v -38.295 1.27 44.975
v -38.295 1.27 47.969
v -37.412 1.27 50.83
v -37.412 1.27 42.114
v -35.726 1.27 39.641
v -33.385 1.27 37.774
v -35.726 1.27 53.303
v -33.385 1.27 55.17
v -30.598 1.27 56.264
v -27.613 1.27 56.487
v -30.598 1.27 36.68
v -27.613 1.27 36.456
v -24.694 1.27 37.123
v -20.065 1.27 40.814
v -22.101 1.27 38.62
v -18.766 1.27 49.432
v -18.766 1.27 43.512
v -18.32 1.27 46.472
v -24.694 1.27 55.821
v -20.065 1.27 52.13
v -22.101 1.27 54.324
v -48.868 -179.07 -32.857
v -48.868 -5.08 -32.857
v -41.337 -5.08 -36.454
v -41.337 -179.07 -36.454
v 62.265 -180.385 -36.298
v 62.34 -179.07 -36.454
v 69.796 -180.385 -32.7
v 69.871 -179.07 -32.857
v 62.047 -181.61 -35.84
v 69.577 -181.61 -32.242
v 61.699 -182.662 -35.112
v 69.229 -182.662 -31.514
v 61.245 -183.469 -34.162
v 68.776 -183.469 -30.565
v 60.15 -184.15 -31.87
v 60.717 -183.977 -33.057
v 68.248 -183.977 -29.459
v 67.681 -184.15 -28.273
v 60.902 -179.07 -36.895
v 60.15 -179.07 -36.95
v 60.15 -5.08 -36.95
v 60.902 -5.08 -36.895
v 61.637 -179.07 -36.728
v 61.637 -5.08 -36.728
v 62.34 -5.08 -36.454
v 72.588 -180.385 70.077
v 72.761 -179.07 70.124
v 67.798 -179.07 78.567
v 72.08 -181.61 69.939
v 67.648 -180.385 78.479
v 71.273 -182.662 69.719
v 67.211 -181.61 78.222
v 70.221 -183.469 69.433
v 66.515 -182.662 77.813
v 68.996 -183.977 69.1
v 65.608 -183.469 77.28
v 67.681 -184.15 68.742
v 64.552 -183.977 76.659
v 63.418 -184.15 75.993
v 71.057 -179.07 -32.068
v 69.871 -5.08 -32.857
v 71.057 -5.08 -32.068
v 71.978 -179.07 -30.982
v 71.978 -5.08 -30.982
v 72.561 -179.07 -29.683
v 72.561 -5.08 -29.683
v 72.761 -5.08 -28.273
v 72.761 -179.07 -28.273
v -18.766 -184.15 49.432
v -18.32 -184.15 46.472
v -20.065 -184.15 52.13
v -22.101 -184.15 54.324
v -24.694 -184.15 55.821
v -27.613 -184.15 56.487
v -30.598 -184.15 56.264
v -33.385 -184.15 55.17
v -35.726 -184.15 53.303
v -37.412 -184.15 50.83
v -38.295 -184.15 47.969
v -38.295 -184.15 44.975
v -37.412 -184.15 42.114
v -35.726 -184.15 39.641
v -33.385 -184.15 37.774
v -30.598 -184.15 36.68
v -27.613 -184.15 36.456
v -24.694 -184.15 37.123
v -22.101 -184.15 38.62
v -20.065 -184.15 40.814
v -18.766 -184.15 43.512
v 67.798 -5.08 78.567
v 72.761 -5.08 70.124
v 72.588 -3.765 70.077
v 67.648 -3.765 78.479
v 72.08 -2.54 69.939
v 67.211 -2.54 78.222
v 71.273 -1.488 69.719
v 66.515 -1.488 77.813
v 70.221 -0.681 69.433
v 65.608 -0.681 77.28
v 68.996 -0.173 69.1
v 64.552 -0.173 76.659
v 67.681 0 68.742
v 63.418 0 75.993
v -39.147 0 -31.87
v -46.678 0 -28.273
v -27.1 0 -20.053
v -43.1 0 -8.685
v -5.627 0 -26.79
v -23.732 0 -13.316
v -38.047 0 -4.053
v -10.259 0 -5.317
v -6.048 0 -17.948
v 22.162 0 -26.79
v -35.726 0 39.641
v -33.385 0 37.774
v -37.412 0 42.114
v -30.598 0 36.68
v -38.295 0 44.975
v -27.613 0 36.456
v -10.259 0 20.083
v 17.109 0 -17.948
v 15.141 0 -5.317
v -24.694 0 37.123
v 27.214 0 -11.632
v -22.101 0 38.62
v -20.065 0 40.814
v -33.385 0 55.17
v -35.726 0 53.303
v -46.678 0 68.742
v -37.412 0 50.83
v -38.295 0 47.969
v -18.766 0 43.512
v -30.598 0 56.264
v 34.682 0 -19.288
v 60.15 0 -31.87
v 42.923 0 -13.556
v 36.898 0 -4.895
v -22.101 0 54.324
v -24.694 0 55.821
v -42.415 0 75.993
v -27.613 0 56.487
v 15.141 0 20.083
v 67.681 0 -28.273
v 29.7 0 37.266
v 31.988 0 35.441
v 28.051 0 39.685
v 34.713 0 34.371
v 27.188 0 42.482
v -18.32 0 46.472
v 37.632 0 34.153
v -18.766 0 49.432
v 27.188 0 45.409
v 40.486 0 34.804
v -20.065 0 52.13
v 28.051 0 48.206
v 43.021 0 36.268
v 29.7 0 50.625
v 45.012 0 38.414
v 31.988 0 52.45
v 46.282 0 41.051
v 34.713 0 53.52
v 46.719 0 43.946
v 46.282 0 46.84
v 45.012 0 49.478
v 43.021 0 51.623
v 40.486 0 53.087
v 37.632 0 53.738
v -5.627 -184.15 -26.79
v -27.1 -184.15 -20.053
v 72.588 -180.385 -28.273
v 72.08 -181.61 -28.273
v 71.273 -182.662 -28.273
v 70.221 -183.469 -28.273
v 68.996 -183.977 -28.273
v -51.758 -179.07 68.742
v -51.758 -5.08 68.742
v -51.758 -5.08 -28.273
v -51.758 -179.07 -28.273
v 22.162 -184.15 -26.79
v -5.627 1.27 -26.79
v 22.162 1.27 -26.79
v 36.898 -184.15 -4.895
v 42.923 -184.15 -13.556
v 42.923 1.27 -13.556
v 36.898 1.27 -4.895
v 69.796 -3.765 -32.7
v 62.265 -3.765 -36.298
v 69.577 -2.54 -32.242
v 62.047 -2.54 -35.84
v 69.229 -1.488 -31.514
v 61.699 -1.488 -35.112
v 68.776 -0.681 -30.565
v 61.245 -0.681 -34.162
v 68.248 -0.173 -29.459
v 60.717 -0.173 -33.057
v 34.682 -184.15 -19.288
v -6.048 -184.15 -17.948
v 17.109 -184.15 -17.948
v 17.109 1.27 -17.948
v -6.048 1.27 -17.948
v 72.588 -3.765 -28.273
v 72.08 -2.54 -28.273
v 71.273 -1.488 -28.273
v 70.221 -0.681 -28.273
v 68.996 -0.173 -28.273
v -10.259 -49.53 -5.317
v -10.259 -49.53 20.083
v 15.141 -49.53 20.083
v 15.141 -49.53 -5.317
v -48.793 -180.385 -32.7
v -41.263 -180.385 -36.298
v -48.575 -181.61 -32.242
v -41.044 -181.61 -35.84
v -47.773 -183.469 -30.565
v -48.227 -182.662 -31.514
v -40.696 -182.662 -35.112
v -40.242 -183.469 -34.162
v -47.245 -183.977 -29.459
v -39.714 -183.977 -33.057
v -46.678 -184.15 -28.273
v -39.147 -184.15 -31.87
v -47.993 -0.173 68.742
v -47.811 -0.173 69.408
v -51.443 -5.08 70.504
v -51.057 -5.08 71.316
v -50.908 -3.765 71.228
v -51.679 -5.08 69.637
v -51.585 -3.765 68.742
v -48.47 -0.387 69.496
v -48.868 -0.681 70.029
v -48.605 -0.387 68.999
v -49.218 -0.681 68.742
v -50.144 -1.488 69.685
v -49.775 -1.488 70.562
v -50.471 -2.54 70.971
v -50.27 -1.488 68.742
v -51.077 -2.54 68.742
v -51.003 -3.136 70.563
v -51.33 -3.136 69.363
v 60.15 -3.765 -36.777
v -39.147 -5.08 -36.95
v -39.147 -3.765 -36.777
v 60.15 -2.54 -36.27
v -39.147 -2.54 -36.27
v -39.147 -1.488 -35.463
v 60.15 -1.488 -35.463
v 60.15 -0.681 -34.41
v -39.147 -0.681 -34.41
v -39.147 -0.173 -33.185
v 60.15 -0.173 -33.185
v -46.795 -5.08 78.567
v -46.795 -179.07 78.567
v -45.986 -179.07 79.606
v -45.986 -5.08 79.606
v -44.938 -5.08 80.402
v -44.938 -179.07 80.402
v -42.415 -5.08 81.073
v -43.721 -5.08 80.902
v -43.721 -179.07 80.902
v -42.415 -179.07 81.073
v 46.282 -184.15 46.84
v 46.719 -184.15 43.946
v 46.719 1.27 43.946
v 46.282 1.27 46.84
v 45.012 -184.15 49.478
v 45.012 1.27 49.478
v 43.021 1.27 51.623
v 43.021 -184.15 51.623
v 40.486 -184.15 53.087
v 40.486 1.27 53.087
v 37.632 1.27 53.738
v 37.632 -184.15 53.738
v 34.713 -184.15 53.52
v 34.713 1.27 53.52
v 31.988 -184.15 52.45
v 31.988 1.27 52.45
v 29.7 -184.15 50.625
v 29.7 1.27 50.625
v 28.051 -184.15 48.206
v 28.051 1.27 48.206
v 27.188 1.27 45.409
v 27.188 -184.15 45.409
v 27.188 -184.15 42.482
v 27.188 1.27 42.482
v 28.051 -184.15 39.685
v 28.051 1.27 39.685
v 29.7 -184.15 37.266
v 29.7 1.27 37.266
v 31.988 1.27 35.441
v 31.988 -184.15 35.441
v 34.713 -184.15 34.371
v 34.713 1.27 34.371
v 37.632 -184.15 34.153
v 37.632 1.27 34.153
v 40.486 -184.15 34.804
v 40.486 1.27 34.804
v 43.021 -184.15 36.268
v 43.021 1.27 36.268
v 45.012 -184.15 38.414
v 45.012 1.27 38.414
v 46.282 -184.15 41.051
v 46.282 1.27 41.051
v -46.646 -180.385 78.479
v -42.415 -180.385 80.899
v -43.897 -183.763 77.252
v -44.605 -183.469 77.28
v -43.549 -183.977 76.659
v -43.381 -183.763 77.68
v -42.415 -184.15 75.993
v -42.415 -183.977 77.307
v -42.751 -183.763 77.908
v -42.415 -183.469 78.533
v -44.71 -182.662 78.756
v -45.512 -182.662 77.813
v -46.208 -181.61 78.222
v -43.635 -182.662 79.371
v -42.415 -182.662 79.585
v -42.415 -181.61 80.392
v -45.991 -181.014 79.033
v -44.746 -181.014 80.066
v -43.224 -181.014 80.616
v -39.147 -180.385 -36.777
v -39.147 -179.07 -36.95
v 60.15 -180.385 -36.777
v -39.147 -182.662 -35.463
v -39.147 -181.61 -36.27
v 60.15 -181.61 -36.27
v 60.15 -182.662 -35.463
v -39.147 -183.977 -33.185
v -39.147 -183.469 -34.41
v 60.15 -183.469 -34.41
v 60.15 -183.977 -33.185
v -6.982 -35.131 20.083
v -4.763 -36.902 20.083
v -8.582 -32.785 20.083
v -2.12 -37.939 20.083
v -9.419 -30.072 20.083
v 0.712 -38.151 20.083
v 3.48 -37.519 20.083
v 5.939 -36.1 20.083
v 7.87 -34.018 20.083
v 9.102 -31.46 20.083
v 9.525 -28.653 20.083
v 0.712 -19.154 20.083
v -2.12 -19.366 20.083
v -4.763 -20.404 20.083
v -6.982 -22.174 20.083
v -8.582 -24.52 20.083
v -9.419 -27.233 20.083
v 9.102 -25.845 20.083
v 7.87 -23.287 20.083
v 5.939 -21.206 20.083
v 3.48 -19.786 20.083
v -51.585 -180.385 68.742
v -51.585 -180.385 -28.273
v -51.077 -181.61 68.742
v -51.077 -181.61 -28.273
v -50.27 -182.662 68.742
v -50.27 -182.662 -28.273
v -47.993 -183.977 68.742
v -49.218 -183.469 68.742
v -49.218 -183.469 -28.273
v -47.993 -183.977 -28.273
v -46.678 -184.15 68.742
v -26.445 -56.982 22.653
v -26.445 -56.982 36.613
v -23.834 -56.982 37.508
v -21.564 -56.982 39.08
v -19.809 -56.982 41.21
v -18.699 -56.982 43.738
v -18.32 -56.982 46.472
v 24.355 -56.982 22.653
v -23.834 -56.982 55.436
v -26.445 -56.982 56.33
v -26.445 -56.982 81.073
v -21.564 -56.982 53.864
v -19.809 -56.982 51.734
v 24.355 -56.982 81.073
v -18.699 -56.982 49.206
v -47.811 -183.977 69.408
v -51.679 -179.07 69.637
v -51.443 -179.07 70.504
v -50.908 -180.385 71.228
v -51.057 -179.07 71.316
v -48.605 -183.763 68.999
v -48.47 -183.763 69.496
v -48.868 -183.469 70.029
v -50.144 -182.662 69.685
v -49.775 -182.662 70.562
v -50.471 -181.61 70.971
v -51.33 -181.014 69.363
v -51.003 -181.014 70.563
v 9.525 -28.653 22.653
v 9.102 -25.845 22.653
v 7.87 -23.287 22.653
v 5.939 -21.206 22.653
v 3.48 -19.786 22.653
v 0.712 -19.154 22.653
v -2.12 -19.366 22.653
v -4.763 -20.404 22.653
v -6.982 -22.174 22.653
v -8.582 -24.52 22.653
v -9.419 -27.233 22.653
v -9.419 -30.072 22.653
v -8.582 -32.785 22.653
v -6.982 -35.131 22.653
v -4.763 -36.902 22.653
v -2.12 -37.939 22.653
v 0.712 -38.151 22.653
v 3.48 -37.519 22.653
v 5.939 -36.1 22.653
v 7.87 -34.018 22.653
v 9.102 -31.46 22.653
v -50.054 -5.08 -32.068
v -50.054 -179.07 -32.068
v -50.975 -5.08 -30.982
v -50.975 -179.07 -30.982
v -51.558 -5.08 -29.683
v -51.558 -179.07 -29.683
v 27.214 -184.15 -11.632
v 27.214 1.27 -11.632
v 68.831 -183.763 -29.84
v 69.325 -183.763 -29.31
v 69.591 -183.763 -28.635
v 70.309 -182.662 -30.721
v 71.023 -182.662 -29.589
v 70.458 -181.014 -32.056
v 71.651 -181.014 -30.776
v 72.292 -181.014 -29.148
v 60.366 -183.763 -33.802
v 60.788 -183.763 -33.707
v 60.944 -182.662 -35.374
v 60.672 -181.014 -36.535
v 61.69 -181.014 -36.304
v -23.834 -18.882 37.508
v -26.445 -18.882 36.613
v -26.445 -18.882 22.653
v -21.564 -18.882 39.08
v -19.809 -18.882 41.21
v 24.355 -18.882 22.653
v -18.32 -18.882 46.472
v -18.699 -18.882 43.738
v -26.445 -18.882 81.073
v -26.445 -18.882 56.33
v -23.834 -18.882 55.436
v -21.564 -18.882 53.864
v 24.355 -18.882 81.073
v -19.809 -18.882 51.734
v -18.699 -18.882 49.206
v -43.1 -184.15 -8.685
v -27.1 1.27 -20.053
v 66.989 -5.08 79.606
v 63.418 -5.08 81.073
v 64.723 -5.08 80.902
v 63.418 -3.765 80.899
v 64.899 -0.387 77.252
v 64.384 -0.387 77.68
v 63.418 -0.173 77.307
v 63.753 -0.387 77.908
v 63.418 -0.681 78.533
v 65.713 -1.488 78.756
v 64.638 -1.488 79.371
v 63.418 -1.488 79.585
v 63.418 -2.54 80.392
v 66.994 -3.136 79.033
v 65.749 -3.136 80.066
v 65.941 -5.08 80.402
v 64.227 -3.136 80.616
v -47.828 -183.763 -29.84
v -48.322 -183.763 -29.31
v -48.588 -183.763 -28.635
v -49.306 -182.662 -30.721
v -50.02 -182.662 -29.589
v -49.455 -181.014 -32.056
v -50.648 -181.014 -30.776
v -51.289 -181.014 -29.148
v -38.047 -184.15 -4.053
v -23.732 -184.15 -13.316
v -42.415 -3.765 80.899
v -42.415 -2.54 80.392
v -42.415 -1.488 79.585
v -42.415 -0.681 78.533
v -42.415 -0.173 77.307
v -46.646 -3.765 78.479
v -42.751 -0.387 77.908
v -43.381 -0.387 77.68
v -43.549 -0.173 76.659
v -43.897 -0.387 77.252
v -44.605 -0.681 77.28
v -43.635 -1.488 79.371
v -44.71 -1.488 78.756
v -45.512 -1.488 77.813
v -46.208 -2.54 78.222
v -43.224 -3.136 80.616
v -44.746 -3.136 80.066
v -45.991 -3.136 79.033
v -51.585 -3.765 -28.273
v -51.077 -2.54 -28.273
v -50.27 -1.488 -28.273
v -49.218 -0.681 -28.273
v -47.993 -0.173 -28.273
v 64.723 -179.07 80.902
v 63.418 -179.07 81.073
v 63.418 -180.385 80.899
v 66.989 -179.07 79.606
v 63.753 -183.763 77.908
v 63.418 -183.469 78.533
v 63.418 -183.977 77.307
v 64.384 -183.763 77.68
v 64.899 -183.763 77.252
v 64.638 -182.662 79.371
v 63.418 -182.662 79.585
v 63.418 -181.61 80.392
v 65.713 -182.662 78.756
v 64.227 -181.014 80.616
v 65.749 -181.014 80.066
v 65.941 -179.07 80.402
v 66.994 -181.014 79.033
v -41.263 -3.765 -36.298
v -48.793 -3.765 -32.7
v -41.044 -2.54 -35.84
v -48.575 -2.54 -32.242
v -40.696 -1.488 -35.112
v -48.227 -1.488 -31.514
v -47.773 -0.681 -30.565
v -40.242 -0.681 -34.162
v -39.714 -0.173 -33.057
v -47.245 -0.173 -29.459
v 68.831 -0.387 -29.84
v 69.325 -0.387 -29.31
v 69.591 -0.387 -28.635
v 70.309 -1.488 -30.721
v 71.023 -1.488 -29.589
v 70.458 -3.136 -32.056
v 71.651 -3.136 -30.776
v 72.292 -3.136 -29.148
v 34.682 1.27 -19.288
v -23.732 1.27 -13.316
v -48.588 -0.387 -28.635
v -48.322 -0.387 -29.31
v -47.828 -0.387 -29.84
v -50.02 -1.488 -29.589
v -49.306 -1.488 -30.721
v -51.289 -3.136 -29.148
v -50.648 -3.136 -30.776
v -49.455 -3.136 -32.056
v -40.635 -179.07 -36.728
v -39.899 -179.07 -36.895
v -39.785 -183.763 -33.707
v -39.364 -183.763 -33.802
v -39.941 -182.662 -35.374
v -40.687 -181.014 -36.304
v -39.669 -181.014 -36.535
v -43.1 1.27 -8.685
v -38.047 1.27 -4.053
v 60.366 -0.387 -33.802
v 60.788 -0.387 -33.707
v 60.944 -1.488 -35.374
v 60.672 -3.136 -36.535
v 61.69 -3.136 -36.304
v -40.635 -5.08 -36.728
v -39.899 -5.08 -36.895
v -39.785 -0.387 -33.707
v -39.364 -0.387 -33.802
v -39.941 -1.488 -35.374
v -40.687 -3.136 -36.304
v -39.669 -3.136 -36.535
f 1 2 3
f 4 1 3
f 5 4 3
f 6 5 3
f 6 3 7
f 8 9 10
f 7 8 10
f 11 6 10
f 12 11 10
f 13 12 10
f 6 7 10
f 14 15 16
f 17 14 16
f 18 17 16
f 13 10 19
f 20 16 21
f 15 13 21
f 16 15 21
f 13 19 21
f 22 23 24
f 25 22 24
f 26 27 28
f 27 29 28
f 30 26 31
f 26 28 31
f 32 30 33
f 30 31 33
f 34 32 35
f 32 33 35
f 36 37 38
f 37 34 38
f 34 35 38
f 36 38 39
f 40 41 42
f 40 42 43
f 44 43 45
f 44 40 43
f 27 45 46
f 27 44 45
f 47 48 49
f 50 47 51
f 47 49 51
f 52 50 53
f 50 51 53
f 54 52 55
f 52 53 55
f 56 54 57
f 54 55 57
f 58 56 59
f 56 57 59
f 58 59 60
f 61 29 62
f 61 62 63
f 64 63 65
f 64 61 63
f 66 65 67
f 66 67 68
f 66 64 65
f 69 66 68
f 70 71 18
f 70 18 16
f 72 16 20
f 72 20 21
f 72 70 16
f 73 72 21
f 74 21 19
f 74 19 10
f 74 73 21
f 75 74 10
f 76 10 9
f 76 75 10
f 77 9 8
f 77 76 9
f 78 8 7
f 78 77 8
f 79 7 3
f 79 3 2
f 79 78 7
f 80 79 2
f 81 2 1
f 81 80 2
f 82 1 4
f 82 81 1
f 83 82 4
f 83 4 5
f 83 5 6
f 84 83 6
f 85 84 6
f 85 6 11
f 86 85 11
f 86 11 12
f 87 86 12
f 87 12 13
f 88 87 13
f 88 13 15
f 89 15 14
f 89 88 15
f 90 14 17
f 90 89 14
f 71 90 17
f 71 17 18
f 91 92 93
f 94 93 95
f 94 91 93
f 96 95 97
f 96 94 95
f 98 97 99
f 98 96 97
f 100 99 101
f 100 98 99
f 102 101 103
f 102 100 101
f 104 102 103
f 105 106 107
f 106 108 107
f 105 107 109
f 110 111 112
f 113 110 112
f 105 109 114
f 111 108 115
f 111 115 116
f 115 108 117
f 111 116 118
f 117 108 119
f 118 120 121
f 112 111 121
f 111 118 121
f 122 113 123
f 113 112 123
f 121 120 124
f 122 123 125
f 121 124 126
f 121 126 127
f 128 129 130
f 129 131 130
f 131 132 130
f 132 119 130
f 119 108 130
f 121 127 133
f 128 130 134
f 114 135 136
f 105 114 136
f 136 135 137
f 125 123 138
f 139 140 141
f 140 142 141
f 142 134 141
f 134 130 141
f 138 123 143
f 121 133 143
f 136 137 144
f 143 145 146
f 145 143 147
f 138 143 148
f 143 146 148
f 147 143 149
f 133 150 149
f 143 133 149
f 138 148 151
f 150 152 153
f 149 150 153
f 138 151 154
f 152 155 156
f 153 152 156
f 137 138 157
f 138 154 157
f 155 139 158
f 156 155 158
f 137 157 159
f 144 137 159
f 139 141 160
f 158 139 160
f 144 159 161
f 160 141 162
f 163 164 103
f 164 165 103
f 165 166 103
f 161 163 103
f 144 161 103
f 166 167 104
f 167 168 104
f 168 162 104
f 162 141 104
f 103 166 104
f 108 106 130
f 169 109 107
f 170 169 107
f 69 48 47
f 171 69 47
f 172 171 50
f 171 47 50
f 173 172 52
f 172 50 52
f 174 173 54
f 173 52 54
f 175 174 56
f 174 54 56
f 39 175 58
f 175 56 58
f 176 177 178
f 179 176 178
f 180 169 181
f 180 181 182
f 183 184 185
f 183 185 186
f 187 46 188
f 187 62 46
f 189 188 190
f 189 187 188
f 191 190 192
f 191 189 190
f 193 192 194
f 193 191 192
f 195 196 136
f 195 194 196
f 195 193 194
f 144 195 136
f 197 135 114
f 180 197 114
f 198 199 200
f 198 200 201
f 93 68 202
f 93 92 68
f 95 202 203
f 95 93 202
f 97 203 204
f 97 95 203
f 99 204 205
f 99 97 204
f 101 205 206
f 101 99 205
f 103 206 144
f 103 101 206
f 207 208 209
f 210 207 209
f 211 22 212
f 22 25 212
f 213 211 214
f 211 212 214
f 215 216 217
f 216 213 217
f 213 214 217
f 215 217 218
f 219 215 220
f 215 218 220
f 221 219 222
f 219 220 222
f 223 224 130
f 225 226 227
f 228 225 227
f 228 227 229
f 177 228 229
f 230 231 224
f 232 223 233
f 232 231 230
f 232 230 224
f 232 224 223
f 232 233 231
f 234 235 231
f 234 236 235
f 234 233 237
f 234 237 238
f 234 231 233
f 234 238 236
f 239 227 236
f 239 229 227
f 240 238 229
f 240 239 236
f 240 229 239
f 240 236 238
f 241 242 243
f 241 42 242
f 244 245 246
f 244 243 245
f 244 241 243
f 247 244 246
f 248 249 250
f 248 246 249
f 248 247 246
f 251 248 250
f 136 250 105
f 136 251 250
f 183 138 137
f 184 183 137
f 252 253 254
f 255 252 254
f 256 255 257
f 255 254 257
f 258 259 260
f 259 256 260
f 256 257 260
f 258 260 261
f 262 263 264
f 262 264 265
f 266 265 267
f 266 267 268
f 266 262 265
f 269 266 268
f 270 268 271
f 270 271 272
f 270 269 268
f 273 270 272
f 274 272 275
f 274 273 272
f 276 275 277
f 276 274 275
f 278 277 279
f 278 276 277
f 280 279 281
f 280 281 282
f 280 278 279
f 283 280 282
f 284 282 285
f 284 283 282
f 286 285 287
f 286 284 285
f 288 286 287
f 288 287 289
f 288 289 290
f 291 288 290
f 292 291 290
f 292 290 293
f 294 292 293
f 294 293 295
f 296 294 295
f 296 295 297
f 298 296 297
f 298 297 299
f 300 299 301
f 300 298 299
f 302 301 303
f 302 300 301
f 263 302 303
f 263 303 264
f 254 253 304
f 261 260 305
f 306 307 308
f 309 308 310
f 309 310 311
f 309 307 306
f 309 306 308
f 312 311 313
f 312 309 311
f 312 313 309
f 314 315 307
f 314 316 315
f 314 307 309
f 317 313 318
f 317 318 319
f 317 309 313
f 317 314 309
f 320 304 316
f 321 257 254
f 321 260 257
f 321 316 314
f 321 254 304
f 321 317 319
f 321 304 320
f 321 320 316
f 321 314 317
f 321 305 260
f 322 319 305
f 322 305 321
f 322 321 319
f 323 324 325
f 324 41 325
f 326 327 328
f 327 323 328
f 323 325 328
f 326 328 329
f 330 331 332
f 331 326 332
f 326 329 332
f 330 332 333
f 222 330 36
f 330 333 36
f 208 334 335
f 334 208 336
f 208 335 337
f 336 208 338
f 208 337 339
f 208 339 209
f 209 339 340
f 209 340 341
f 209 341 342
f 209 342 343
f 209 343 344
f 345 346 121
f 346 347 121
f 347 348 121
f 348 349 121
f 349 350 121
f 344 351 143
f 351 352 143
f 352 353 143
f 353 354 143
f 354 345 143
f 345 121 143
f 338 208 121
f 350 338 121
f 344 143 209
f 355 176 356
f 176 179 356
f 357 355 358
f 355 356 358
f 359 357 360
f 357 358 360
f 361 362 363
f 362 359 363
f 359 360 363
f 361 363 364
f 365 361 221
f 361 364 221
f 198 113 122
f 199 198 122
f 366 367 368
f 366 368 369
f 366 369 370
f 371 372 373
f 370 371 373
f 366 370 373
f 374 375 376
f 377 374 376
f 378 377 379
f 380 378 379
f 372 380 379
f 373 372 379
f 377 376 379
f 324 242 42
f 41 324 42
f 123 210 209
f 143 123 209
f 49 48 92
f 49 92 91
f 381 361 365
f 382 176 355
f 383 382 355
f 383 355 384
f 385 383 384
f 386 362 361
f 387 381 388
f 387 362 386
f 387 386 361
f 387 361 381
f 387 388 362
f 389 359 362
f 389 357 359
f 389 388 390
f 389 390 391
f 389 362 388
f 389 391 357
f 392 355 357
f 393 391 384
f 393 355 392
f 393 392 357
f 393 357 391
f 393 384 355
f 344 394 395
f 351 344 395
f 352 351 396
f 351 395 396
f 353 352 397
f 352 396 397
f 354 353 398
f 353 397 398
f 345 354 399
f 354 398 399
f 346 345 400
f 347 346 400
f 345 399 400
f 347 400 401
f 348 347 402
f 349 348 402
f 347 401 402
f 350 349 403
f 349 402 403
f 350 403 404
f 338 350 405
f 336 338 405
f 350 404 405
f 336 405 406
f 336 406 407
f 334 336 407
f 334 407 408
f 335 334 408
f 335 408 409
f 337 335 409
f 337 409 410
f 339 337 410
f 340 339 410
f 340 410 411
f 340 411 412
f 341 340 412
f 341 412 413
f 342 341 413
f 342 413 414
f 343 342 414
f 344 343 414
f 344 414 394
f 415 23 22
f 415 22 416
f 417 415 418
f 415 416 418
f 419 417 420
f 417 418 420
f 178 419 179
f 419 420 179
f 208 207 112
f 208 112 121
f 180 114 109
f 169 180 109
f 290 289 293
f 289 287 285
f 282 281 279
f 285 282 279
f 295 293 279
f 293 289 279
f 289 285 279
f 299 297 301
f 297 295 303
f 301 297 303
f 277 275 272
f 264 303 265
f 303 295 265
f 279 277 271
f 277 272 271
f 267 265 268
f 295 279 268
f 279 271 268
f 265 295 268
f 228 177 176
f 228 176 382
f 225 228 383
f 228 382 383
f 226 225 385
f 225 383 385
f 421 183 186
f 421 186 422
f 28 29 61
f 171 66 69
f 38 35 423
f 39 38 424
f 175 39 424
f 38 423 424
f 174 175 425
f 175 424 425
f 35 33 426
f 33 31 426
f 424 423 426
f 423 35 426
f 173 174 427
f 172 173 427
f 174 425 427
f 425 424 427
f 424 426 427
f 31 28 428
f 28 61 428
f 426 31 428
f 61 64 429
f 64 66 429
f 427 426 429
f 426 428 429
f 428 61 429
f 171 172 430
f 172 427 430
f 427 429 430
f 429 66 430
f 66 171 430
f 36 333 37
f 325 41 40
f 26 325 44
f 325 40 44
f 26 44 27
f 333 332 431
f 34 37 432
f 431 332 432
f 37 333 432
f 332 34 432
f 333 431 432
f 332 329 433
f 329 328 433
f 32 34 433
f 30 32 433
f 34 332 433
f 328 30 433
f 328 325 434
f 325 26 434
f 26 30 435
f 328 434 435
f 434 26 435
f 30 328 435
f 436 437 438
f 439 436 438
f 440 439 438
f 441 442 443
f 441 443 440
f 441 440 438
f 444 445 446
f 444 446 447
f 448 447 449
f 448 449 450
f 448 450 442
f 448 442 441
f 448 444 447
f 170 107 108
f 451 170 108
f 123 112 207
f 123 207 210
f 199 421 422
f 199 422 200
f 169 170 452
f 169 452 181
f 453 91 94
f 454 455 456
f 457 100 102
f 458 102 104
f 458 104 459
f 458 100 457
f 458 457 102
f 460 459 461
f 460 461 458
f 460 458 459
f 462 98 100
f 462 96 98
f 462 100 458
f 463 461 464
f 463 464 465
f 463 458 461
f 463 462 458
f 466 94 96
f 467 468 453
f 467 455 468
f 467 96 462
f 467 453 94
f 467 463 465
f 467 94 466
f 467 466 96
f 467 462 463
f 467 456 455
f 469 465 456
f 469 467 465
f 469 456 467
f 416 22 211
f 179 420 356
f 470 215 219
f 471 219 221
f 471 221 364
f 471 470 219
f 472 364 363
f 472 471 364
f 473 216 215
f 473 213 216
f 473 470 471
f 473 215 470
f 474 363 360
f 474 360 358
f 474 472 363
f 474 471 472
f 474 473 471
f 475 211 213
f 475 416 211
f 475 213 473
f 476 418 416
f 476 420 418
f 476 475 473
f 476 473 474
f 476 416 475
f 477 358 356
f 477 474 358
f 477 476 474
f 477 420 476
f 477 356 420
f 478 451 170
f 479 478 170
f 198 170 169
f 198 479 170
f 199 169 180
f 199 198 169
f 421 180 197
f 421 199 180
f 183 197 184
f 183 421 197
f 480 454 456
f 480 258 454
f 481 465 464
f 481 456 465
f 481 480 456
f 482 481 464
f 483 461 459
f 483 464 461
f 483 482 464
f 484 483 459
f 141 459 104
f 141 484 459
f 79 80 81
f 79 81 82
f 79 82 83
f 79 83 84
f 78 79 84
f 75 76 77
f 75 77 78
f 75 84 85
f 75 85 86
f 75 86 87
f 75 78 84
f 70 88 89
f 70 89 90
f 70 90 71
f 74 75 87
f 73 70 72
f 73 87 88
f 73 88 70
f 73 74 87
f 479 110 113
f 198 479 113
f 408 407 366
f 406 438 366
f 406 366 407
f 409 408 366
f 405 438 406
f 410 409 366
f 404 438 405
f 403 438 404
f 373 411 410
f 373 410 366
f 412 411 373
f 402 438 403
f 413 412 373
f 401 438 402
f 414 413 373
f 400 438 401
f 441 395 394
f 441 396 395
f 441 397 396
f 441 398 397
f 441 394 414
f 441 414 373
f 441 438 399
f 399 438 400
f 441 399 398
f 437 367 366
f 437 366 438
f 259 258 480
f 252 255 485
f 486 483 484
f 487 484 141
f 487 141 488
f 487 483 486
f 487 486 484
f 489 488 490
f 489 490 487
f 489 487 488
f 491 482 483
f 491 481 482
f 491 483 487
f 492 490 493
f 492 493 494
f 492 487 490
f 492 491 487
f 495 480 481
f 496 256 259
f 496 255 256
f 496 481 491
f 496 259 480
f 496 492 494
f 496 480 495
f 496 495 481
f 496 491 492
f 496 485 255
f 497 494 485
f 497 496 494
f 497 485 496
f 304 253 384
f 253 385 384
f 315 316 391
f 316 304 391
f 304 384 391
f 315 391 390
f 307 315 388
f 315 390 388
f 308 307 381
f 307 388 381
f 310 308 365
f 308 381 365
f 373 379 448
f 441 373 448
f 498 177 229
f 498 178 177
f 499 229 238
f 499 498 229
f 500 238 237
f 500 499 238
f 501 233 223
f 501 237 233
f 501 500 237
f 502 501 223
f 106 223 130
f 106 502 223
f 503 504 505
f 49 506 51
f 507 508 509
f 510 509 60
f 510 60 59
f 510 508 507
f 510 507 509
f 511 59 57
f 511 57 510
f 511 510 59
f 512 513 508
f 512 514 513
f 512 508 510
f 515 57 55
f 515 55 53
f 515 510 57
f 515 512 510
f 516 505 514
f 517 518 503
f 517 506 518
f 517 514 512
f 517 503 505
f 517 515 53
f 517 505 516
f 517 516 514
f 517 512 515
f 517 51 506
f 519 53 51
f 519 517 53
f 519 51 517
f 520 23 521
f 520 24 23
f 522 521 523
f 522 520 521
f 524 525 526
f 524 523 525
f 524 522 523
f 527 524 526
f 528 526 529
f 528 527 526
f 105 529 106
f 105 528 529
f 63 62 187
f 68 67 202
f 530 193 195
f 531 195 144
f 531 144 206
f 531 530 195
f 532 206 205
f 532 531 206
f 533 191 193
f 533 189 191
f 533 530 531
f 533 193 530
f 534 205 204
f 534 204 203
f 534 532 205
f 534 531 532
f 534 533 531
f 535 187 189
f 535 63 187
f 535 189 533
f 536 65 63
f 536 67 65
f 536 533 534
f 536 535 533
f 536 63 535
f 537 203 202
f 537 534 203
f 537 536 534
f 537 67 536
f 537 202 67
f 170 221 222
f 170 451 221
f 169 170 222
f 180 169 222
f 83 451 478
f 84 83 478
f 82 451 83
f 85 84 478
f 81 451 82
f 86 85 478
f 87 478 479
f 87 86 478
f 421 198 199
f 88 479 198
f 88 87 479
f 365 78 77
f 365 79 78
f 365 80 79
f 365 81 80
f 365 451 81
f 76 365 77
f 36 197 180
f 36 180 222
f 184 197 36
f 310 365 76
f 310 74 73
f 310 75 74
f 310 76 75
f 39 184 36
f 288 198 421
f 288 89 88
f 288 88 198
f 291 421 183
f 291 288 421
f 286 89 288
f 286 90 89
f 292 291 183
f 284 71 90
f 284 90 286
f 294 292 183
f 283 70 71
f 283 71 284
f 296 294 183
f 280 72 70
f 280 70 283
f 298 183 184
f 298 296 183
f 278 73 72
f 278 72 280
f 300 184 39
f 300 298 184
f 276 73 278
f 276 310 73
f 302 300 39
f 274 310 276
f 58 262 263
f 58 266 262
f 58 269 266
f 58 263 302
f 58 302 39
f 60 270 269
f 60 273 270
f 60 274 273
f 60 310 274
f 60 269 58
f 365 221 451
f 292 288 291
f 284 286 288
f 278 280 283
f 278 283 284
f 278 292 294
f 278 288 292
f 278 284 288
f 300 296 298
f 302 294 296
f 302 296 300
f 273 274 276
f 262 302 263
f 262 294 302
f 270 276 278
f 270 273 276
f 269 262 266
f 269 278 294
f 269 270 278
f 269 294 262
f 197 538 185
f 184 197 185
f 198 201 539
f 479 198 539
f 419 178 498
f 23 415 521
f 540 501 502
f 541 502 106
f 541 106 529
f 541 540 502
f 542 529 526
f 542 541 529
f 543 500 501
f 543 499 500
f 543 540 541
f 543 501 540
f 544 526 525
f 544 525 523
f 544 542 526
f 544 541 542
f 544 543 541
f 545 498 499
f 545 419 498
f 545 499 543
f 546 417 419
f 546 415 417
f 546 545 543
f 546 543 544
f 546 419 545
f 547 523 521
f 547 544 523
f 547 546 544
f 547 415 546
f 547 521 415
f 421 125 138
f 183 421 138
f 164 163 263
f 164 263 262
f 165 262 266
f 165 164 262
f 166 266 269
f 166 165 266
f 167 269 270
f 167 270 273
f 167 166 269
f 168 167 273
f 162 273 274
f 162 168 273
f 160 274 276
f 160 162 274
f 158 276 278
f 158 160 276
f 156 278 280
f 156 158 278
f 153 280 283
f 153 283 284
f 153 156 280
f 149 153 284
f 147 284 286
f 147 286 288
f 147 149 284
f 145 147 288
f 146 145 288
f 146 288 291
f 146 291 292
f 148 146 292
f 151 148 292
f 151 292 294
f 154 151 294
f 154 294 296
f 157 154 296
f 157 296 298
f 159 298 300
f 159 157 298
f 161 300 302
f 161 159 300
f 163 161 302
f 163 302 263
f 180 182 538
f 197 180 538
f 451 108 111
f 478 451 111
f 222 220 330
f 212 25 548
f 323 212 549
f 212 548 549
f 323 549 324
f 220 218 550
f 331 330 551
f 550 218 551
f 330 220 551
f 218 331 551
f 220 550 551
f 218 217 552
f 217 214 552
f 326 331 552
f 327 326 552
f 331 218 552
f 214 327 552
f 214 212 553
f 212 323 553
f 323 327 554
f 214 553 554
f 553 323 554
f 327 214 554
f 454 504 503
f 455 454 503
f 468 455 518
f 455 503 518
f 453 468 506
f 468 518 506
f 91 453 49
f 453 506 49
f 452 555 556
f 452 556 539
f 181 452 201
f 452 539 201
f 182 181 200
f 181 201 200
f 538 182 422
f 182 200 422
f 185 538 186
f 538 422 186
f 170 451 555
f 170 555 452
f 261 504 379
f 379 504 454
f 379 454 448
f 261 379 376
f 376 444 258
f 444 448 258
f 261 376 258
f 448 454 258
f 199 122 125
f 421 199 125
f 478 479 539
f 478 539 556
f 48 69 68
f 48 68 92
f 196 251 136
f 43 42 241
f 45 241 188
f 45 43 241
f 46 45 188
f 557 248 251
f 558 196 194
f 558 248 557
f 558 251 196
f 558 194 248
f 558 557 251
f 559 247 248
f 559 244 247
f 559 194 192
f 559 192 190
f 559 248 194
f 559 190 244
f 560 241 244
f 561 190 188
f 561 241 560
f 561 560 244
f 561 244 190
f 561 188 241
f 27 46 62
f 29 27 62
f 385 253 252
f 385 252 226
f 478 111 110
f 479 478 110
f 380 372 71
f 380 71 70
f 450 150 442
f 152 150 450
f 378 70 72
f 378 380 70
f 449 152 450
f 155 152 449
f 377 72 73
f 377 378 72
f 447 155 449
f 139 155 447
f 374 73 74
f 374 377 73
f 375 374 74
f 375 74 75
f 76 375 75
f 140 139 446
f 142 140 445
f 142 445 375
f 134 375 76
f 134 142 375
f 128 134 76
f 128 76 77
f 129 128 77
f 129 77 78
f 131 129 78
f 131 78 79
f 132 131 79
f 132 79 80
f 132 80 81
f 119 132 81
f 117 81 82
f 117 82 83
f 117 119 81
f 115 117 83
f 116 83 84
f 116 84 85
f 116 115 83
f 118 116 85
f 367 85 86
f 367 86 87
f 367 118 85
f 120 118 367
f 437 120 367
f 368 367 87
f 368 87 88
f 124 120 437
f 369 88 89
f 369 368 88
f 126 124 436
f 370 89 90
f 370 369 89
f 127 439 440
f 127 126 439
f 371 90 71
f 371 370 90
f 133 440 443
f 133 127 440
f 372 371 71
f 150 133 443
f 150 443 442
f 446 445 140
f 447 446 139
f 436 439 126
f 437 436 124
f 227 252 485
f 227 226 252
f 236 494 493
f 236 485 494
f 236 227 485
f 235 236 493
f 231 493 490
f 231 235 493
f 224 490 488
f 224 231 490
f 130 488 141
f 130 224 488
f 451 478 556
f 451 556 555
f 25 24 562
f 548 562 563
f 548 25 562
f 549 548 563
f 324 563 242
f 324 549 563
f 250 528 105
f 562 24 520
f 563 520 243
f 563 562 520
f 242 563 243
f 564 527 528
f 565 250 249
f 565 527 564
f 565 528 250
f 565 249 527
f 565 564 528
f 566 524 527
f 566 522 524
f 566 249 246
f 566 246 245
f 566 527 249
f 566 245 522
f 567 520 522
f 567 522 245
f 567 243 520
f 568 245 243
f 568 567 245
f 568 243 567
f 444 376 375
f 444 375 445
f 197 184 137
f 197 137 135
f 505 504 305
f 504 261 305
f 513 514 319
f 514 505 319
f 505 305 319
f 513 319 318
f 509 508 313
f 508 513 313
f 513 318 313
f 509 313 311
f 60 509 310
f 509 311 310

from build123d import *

# Parameters (mm, degrees)
F0_W      = 25.4
F0_H      = 25.4
F0_R      = 10.043463073
F0_R_2    = 9.820348736
F1_DEPTH  = 184.15
F2_R      = 5.08
F3_R      = 10.043463073
F4_DEPTH  = 185.42
F3_R_2    = 9.820348736
F5_W      = 25.4
F5_H      = 25.4
F6_DEPTH  = 134.62
F7_W      = 50.8
F7_H      = 38.1
F8_DEPTH  = 58.42
F10_R     = 9.525
F11_DEPTH = 25.4


with BuildPart() as f1:
    # F0 (on Front) → F1 (new body)
    with BuildSketch(Plane.XZ):
        Polygon((-51.7580384496, -31.4757533676), (-40.2986610914, -36.9504835493), (61.3013389086, -36.9504835493), (72.7607162668, -31.4757533676), (72.7607162668, 70.1242466324), (66.3245889743, 81.0725919628), (-45.321911157, 81.0725919628), (-51.7580384496, 70.1242466324), align=None)
        Polygon((-43.0999696255, -8.6848856881), (-38.0474403501, -4.0534022264), (-23.7319488078, -13.3163677529), (-6.0481042601, -17.9478526115), (17.1093102545, -17.9478526115), (27.2143669426, -11.6321938112), (36.8983782828, -4.8954910599), (42.9227925135, -13.5555875316), (34.6821272495, -19.2882235651), (22.1618395299, -26.7897751182), (-5.6270603091, -26.7897751182), (-27.1002985537, -20.0530737638), align=None, mode=Mode.SUBTRACT)
        with Locations((2.4414576262, 7.3834645234)):
            Rectangle(F0_W, F0_H, mode=Mode.SUBTRACT)
        with Locations((-28.3634308726, 46.4718677104)):
            Circle(F0_R, mode=Mode.SUBTRACT)
        with Locations((36.8983782828, 43.9456030726)):
            Circle(F0_R_2, mode=Mode.SUBTRACT)
    extrude(amount=F1_DEPTH)

    # F2
    f2_edges = [f1.edges().sort_by_distance(p)[0] for p in [
        (69.542653, 0, 75.598419),
        (10.501339, 0, 81.072592),
        (-48.539975, 0, 75.598419),
        (-51.758038, 0, 19.324247),
        (-46.02835, 0, -34.213118),
        (10.501339, 0, -36.950484),
        (67.031028, 0, -34.213118),
        (72.760716, 0, 19.324247),
        (-51.758038, -92.075, 70.124247),
        (-45.321911, -92.075, 81.072592),
        (-51.758038, -92.075, -31.475753),
        (-40.298661, -92.075, -36.950484),
        (-46.02835, -184.15, -34.213118),
        (-51.758038, -184.15, 19.324247),
        (-48.539975, -184.15, 75.598419),
        (72.760716, -92.075, -31.475753),
        (10.501339, -184.15, -36.950484),
        (67.031028, -184.15, -34.213118),
        (72.760716, -184.15, 19.324247),
        (10.501339, -184.15, 81.072592),
        (69.542653, -184.15, 75.598419),
        (66.324589, -92.075, 81.072592),
        (61.301339, -92.075, -36.950484),
    ]]
    fillet(f2_edges, radius=F2_R)

    # F5 (on face) → F6 (join)
    with BuildSketch(Plane.XZ.offset(184.15)):
        with Locations((2.4414576262, 7.3834645234)):
            Rectangle(F5_W, F5_H)
    extrude(amount=-F6_DEPTH)

    # F7 (on face) → F8 (cut)
    with BuildSketch(Plane.XY.offset(81.0725919628)):
        with Locations((-1.045239158, -37.9315156187)):
            Rectangle(F7_W, F7_H)
    extrude(amount=-F8_DEPTH, mode=Mode.SUBTRACT)

    # F10 (on face) → F11 (cut)
    with BuildSketch(Plane.XY.offset(22.6525919628)):
        with Locations((0, -28.652665766)):
            Circle(F10_R)
    extrude(amount=-F11_DEPTH, mode=Mode.SUBTRACT)


with BuildPart() as f4:
    # F3 (on face) → F4 (new body)
    with BuildSketch(Plane.XZ.offset(184.15)):
        with Locations((-28.3634308726, 46.4718677104)):
            Circle(F3_R)
    extrude(amount=-F4_DEPTH)


with BuildPart() as f4b:
    # F3 (on face) → F4, piece 2 (new body)
    with BuildSketch(Plane.XZ.offset(184.15)):
        with Locations((36.8983782828, 43.9456030726)):
            Circle(F3_R_2)
    extrude(amount=-F4_DEPTH)


with BuildPart() as f4c:
    # F3 (on face) → F4, piece 3 (new body)
    with BuildSketch(Plane.XZ.offset(184.15)):
        Polygon((-27.1002985537, -20.0530737638), (-5.6270603091, -26.7897751182), (22.1618395299, -26.7897751182), (34.6821272495, -19.2882235651), (42.9227925135, -13.5555875316), (36.8983782828, -4.8954910599), (27.2143669426, -11.6321938112), (17.1093102545, -17.9478526115), (-6.0481042601, -17.9478526115), (-23.7319488078, -13.3163677529), (-38.0474403501, -4.0534022264), (-43.0999696255, -8.6848856881), align=None)
    extrude(amount=-F4_DEPTH)


solid = Compound([f1.part, f4.part, f4b.part, f4c.part])
